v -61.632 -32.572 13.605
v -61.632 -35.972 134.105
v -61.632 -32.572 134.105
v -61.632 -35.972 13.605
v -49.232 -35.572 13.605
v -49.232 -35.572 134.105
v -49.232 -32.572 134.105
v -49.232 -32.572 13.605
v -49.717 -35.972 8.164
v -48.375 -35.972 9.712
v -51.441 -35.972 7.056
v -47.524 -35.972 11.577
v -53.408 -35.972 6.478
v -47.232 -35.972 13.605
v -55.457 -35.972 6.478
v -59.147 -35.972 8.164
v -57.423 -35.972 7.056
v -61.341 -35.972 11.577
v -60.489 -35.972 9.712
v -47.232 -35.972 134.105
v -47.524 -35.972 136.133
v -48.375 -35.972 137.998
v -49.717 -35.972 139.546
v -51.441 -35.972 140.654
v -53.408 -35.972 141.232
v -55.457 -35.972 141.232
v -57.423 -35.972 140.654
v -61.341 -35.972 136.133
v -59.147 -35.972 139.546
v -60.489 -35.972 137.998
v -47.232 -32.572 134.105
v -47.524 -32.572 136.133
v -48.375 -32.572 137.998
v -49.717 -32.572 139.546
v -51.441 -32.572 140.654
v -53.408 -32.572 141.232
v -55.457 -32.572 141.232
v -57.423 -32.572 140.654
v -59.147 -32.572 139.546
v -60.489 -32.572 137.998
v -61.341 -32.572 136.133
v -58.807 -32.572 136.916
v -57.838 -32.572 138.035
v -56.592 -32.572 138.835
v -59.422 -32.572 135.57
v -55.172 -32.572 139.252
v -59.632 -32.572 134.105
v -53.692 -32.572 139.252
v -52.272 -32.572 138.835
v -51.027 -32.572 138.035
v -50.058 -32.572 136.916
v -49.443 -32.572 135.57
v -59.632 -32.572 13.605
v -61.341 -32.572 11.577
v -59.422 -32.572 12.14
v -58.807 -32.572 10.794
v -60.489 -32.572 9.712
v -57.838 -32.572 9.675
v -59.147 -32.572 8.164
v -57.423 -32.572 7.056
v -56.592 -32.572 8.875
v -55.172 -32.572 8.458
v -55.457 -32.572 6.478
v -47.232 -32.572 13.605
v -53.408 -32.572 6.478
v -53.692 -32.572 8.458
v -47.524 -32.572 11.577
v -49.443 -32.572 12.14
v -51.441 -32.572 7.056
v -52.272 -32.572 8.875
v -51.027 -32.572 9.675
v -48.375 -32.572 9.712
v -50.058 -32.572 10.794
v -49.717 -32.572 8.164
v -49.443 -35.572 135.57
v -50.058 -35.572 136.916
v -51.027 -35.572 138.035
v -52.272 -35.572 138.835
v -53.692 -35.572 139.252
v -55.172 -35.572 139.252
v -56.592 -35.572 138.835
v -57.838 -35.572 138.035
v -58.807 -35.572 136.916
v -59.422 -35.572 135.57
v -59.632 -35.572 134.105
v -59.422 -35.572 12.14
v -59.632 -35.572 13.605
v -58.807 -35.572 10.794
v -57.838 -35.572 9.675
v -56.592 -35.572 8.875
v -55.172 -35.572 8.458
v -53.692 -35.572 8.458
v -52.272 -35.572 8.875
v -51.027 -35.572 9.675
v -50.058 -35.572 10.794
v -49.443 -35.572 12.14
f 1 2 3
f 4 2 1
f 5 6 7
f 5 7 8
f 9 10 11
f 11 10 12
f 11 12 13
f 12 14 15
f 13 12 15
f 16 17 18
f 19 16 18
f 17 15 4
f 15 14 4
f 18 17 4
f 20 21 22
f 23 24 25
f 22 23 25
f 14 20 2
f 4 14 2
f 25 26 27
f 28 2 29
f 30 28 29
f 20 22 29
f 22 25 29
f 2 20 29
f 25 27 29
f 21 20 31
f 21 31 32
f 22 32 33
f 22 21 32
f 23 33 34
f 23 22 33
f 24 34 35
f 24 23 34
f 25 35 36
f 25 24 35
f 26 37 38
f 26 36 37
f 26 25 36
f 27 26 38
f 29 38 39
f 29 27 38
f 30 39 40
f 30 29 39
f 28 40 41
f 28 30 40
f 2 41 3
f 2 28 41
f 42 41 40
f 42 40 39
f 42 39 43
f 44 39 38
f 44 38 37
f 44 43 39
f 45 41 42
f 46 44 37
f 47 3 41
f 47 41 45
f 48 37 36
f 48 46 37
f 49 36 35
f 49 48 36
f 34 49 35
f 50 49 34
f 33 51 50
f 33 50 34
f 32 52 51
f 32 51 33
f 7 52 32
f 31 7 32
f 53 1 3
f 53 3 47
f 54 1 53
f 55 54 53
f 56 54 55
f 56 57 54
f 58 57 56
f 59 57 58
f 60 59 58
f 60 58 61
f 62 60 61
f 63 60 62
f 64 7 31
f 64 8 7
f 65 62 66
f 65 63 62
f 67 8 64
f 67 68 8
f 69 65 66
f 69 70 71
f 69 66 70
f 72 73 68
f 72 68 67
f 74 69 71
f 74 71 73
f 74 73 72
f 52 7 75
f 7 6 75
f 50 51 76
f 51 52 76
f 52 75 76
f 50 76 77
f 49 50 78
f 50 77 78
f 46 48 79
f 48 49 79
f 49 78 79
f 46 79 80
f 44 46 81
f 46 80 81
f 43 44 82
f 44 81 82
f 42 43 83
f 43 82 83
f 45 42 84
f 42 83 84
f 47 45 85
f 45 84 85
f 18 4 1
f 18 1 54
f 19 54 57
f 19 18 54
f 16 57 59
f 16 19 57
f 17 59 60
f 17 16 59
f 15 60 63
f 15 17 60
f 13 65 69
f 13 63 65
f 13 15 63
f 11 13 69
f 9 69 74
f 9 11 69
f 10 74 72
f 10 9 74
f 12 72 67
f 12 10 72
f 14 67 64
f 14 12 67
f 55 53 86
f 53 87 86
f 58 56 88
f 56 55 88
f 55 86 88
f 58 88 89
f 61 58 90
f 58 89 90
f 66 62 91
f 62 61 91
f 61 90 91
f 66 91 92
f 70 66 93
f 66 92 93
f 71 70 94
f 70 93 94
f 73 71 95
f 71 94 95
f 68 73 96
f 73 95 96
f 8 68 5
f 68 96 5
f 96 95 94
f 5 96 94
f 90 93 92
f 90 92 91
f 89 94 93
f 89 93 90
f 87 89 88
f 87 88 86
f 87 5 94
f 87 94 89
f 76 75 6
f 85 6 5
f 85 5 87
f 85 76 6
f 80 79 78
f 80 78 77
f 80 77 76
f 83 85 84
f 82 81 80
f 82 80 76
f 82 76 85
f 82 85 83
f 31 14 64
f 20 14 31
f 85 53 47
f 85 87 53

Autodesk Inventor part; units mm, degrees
ref_plane "YZ Plane" through (0, 0, 0) normal (1, 0, 0) x (0, 1, 0)
ref_plane "XZ Plane" through (0, 0, 0) normal (0, 1, 0) x (-1, 0, 0)
ref_plane "XY Plane" through (0, 0, 0) normal (0, 0, 1) x (1, 0, 0)
ref_plane "Work Plane1" through (-54.4323, -35.9721, 73.855) normal (0, 1, 0) x (-1, 0, 0)
sketch "Sketch1" plane through (-54.4323, -35.9721, 73.855) normal (0, 1, 0) x (-1, 0, 0)
  arc A0 (7.2, 60.25) -> (-7.2, 60.25) centre (0, 60.25) ccw projected
  line L0 (-7.2, -60.25) -> (-7.2, 60.25) projected
  arc A1 (-7.2, -60.25) -> (7.2, -60.25) centre (0, -60.25) ccw projected
  line L1 (7.2, 60.25) -> (7.2, -60.25) projected
  arc A2 (-5.2, -60.25) -> (5.2, -60.25) centre (0, -60.25) ccw projected
  line L2 (-5.2, -60.25) -> (-5.2, 60.25) projected
  line L3 (5.2, 60.25) -> (5.2, -60.25) projected
  arc A3 (5.2, 60.25) -> (-5.2, 60.25) centre (0, 60.25) ccw projected
  point P0 (-54.4323, -73.855)
extrude "Extrusion1" add sketch "Sketch1" along normal blind 0.4 contours L1 A1 L0 A0 | L2 A3 L3 A2
sketch "Sketch2" plane through (-54.4323, -35.5721, 73.855) normal (0, 1, 0) x (1, 0, 0)
  arc A0 (-7.2, -60.25) -> (7.2, -60.25) centre (0, -60.25) ccw projected
  line L0 (-7.2, -60.25) -> (-7.2, 60.25) projected
  arc A1 (7.2, 60.25) -> (-7.2, 60.25) centre (0, 60.25) ccw projected
  line L1 (7.2, 60.25) -> (7.2, -60.25) projected
  line L2 (5.2, -60.25) -> (5.2, 60.25) projected
  arc A2 (5.2, 60.25) -> (-5.2, 60.25) centre (0, 60.25) ccw projected
  line L3 (-5.2, 60.25) -> (-5.2, -60.25) projected
  arc A3 (-5.2, -60.25) -> (5.2, -60.25) centre (0, -60.25) ccw projected
  point P0 (54.4323, 73.855)
extrude "Extrusion2" add sketch "Sketch2" along normal blind 3
properties part number "wiper_outside" material "ABS Plastic"
